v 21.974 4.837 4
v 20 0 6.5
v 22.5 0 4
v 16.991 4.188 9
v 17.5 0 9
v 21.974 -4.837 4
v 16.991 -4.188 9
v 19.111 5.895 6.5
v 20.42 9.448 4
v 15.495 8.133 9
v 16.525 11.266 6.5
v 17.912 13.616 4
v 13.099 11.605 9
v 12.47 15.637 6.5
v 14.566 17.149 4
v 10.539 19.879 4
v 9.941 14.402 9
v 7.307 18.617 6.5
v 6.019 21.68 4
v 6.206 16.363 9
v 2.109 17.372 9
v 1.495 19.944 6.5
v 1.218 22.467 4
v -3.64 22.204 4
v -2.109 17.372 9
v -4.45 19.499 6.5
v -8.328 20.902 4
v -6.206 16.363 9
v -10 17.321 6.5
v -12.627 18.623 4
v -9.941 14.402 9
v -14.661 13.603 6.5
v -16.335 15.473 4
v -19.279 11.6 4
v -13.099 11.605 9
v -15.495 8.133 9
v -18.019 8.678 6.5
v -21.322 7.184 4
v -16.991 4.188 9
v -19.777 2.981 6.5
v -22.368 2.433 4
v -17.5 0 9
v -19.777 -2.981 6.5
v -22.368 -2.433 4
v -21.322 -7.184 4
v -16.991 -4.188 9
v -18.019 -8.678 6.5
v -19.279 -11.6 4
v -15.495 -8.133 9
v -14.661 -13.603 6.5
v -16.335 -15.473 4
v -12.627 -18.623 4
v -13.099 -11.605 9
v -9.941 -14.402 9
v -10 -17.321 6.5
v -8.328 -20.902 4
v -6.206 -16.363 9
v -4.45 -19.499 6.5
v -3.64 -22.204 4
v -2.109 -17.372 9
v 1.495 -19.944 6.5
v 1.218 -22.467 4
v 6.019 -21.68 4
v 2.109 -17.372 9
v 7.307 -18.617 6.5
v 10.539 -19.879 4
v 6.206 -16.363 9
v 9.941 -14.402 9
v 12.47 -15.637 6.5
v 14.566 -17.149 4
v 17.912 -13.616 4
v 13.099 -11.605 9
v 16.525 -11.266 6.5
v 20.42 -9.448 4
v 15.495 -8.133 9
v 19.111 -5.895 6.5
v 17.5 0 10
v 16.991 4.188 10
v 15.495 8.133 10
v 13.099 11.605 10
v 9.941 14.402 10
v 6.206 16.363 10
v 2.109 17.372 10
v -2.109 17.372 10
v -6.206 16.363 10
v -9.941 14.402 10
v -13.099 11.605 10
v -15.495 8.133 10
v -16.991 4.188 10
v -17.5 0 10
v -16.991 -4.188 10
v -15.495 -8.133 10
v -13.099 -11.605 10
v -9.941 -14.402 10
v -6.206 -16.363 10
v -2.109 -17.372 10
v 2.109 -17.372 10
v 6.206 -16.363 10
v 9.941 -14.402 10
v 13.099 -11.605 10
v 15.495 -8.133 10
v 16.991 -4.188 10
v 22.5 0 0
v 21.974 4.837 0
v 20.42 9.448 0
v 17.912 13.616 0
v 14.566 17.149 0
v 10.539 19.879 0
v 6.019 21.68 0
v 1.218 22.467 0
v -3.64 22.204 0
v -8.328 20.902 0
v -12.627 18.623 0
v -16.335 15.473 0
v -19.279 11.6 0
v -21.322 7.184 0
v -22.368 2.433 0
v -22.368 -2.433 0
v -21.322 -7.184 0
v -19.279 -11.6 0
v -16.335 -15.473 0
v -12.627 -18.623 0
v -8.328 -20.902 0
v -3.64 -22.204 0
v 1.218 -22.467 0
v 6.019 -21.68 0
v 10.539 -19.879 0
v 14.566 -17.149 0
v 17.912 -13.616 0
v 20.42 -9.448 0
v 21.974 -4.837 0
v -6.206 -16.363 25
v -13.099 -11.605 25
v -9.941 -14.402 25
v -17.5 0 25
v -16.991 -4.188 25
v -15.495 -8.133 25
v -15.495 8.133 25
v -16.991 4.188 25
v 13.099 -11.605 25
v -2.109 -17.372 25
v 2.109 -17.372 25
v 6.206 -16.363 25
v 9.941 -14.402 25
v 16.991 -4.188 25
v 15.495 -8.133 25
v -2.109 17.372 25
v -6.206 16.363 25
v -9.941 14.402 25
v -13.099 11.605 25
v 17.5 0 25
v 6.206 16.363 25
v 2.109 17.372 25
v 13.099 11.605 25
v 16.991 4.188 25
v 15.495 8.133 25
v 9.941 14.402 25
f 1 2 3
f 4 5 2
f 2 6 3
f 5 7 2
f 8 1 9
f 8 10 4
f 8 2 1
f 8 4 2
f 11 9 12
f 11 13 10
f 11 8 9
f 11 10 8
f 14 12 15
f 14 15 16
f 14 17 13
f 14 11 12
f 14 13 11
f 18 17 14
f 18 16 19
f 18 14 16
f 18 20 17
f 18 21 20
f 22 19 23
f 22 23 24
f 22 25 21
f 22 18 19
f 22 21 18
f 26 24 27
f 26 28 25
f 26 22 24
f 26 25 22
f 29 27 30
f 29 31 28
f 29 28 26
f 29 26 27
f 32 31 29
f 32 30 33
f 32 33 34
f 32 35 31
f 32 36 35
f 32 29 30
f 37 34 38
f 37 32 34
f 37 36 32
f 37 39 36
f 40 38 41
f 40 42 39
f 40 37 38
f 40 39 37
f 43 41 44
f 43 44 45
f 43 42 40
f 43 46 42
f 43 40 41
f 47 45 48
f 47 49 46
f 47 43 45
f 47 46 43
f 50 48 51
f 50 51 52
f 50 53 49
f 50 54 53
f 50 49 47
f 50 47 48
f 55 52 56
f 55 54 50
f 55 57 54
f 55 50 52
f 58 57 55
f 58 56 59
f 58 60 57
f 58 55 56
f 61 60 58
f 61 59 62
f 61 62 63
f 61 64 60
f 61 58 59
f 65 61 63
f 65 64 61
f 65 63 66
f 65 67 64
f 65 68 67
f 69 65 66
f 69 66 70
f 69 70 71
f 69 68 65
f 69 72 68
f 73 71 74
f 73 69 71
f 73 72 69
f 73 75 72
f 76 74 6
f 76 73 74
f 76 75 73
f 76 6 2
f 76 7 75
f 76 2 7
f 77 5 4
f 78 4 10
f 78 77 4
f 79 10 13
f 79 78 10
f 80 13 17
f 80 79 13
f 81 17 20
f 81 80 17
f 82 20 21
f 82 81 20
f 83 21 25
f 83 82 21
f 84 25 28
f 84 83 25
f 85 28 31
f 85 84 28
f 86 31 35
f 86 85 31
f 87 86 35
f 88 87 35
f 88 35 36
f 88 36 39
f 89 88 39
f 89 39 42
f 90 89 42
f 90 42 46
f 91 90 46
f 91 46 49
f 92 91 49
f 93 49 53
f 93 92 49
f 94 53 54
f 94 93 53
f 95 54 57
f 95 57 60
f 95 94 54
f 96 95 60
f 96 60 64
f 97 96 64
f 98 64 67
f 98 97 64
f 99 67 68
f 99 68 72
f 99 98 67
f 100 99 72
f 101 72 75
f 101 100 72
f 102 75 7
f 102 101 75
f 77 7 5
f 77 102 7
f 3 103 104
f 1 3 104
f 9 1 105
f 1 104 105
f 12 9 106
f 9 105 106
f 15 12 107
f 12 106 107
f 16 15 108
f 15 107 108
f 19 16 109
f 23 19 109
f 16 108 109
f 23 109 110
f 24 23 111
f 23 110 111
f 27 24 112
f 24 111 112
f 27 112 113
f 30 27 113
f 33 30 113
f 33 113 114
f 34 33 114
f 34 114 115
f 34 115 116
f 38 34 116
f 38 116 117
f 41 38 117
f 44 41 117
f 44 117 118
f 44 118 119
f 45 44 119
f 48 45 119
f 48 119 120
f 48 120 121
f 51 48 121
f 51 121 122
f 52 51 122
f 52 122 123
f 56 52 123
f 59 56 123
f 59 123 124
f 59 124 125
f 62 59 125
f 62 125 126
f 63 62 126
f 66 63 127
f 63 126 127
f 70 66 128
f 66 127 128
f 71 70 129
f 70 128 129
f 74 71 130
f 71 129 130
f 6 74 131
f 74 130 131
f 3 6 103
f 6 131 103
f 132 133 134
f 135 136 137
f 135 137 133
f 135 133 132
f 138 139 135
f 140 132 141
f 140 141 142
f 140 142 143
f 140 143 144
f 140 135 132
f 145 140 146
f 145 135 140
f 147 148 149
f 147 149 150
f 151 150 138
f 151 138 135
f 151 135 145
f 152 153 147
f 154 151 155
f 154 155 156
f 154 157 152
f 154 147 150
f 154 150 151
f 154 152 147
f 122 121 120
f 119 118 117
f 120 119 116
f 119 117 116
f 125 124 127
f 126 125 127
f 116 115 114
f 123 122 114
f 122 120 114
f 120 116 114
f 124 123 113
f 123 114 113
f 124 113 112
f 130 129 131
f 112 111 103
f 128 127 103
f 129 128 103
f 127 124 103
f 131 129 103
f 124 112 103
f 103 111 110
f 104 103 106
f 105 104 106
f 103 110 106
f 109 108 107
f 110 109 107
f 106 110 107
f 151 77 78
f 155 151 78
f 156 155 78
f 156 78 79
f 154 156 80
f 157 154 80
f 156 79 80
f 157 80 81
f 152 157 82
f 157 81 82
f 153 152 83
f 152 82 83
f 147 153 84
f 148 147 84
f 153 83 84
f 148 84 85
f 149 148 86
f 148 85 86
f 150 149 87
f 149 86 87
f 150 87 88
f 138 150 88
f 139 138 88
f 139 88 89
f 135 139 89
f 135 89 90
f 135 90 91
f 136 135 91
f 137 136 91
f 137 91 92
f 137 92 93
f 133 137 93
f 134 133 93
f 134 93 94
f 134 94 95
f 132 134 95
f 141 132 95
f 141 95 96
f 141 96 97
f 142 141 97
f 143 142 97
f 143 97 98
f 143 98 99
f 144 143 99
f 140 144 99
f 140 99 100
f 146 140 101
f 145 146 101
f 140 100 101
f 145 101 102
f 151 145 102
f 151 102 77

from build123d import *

# Parameters (mm, degrees)
F0_R        = 22.5
F0_R_2      = 17.5
F1_DEPTH    = 10
F2_DEPTH    = 25
F3_S5_R     = 17.5
F3_T6_DEPTH = 33


# Not quite as in the source:
# - a fillet or chamfer that OpenCascade refuses, or shapes differently, is made with other operations: its cross-section is extruded or revolved along the edge and cut away or added


with BuildPart() as f1:
    # F0 (on Top) → F1 (new body)
    with BuildSketch(Plane.XY):
        Circle(F0_R)
        Circle(F0_R_2, mode=Mode.SUBTRACT)
    extrude(amount=F1_DEPTH)

    # F0 (on Top) → F2 (join)
    with BuildSketch(Plane.XY):
        Circle(F0_R_2)
    extrude(amount=F2_DEPTH)

    # F3: chamfer of 6 on 1 edges, made by hand


with BuildPart() as f3_tool2:
    # F3_s3 → F3_t4 (revolve)
    with BuildSketch(Plane.XZ):
        Polygon((22.5, 4), (16.5, 10), (22.5, 10), align=None)
    revolve(axis=Axis((0, 0, 10), (0, 0, 1)))

    # F3_s5 → F3_t6 (cut, symmetric)
    with BuildSketch(Plane.XY.offset(7)):
        Circle(F3_S5_R)
    extrude(amount=F3_T6_DEPTH, both=True, mode=Mode.SUBTRACT)


with BuildPart() as f1_1:
    add(f1.part)

    # F3_t1: cut F3_tool2
    add(f3_tool2.part, mode=Mode.SUBTRACT)


solid = f1_1.part
